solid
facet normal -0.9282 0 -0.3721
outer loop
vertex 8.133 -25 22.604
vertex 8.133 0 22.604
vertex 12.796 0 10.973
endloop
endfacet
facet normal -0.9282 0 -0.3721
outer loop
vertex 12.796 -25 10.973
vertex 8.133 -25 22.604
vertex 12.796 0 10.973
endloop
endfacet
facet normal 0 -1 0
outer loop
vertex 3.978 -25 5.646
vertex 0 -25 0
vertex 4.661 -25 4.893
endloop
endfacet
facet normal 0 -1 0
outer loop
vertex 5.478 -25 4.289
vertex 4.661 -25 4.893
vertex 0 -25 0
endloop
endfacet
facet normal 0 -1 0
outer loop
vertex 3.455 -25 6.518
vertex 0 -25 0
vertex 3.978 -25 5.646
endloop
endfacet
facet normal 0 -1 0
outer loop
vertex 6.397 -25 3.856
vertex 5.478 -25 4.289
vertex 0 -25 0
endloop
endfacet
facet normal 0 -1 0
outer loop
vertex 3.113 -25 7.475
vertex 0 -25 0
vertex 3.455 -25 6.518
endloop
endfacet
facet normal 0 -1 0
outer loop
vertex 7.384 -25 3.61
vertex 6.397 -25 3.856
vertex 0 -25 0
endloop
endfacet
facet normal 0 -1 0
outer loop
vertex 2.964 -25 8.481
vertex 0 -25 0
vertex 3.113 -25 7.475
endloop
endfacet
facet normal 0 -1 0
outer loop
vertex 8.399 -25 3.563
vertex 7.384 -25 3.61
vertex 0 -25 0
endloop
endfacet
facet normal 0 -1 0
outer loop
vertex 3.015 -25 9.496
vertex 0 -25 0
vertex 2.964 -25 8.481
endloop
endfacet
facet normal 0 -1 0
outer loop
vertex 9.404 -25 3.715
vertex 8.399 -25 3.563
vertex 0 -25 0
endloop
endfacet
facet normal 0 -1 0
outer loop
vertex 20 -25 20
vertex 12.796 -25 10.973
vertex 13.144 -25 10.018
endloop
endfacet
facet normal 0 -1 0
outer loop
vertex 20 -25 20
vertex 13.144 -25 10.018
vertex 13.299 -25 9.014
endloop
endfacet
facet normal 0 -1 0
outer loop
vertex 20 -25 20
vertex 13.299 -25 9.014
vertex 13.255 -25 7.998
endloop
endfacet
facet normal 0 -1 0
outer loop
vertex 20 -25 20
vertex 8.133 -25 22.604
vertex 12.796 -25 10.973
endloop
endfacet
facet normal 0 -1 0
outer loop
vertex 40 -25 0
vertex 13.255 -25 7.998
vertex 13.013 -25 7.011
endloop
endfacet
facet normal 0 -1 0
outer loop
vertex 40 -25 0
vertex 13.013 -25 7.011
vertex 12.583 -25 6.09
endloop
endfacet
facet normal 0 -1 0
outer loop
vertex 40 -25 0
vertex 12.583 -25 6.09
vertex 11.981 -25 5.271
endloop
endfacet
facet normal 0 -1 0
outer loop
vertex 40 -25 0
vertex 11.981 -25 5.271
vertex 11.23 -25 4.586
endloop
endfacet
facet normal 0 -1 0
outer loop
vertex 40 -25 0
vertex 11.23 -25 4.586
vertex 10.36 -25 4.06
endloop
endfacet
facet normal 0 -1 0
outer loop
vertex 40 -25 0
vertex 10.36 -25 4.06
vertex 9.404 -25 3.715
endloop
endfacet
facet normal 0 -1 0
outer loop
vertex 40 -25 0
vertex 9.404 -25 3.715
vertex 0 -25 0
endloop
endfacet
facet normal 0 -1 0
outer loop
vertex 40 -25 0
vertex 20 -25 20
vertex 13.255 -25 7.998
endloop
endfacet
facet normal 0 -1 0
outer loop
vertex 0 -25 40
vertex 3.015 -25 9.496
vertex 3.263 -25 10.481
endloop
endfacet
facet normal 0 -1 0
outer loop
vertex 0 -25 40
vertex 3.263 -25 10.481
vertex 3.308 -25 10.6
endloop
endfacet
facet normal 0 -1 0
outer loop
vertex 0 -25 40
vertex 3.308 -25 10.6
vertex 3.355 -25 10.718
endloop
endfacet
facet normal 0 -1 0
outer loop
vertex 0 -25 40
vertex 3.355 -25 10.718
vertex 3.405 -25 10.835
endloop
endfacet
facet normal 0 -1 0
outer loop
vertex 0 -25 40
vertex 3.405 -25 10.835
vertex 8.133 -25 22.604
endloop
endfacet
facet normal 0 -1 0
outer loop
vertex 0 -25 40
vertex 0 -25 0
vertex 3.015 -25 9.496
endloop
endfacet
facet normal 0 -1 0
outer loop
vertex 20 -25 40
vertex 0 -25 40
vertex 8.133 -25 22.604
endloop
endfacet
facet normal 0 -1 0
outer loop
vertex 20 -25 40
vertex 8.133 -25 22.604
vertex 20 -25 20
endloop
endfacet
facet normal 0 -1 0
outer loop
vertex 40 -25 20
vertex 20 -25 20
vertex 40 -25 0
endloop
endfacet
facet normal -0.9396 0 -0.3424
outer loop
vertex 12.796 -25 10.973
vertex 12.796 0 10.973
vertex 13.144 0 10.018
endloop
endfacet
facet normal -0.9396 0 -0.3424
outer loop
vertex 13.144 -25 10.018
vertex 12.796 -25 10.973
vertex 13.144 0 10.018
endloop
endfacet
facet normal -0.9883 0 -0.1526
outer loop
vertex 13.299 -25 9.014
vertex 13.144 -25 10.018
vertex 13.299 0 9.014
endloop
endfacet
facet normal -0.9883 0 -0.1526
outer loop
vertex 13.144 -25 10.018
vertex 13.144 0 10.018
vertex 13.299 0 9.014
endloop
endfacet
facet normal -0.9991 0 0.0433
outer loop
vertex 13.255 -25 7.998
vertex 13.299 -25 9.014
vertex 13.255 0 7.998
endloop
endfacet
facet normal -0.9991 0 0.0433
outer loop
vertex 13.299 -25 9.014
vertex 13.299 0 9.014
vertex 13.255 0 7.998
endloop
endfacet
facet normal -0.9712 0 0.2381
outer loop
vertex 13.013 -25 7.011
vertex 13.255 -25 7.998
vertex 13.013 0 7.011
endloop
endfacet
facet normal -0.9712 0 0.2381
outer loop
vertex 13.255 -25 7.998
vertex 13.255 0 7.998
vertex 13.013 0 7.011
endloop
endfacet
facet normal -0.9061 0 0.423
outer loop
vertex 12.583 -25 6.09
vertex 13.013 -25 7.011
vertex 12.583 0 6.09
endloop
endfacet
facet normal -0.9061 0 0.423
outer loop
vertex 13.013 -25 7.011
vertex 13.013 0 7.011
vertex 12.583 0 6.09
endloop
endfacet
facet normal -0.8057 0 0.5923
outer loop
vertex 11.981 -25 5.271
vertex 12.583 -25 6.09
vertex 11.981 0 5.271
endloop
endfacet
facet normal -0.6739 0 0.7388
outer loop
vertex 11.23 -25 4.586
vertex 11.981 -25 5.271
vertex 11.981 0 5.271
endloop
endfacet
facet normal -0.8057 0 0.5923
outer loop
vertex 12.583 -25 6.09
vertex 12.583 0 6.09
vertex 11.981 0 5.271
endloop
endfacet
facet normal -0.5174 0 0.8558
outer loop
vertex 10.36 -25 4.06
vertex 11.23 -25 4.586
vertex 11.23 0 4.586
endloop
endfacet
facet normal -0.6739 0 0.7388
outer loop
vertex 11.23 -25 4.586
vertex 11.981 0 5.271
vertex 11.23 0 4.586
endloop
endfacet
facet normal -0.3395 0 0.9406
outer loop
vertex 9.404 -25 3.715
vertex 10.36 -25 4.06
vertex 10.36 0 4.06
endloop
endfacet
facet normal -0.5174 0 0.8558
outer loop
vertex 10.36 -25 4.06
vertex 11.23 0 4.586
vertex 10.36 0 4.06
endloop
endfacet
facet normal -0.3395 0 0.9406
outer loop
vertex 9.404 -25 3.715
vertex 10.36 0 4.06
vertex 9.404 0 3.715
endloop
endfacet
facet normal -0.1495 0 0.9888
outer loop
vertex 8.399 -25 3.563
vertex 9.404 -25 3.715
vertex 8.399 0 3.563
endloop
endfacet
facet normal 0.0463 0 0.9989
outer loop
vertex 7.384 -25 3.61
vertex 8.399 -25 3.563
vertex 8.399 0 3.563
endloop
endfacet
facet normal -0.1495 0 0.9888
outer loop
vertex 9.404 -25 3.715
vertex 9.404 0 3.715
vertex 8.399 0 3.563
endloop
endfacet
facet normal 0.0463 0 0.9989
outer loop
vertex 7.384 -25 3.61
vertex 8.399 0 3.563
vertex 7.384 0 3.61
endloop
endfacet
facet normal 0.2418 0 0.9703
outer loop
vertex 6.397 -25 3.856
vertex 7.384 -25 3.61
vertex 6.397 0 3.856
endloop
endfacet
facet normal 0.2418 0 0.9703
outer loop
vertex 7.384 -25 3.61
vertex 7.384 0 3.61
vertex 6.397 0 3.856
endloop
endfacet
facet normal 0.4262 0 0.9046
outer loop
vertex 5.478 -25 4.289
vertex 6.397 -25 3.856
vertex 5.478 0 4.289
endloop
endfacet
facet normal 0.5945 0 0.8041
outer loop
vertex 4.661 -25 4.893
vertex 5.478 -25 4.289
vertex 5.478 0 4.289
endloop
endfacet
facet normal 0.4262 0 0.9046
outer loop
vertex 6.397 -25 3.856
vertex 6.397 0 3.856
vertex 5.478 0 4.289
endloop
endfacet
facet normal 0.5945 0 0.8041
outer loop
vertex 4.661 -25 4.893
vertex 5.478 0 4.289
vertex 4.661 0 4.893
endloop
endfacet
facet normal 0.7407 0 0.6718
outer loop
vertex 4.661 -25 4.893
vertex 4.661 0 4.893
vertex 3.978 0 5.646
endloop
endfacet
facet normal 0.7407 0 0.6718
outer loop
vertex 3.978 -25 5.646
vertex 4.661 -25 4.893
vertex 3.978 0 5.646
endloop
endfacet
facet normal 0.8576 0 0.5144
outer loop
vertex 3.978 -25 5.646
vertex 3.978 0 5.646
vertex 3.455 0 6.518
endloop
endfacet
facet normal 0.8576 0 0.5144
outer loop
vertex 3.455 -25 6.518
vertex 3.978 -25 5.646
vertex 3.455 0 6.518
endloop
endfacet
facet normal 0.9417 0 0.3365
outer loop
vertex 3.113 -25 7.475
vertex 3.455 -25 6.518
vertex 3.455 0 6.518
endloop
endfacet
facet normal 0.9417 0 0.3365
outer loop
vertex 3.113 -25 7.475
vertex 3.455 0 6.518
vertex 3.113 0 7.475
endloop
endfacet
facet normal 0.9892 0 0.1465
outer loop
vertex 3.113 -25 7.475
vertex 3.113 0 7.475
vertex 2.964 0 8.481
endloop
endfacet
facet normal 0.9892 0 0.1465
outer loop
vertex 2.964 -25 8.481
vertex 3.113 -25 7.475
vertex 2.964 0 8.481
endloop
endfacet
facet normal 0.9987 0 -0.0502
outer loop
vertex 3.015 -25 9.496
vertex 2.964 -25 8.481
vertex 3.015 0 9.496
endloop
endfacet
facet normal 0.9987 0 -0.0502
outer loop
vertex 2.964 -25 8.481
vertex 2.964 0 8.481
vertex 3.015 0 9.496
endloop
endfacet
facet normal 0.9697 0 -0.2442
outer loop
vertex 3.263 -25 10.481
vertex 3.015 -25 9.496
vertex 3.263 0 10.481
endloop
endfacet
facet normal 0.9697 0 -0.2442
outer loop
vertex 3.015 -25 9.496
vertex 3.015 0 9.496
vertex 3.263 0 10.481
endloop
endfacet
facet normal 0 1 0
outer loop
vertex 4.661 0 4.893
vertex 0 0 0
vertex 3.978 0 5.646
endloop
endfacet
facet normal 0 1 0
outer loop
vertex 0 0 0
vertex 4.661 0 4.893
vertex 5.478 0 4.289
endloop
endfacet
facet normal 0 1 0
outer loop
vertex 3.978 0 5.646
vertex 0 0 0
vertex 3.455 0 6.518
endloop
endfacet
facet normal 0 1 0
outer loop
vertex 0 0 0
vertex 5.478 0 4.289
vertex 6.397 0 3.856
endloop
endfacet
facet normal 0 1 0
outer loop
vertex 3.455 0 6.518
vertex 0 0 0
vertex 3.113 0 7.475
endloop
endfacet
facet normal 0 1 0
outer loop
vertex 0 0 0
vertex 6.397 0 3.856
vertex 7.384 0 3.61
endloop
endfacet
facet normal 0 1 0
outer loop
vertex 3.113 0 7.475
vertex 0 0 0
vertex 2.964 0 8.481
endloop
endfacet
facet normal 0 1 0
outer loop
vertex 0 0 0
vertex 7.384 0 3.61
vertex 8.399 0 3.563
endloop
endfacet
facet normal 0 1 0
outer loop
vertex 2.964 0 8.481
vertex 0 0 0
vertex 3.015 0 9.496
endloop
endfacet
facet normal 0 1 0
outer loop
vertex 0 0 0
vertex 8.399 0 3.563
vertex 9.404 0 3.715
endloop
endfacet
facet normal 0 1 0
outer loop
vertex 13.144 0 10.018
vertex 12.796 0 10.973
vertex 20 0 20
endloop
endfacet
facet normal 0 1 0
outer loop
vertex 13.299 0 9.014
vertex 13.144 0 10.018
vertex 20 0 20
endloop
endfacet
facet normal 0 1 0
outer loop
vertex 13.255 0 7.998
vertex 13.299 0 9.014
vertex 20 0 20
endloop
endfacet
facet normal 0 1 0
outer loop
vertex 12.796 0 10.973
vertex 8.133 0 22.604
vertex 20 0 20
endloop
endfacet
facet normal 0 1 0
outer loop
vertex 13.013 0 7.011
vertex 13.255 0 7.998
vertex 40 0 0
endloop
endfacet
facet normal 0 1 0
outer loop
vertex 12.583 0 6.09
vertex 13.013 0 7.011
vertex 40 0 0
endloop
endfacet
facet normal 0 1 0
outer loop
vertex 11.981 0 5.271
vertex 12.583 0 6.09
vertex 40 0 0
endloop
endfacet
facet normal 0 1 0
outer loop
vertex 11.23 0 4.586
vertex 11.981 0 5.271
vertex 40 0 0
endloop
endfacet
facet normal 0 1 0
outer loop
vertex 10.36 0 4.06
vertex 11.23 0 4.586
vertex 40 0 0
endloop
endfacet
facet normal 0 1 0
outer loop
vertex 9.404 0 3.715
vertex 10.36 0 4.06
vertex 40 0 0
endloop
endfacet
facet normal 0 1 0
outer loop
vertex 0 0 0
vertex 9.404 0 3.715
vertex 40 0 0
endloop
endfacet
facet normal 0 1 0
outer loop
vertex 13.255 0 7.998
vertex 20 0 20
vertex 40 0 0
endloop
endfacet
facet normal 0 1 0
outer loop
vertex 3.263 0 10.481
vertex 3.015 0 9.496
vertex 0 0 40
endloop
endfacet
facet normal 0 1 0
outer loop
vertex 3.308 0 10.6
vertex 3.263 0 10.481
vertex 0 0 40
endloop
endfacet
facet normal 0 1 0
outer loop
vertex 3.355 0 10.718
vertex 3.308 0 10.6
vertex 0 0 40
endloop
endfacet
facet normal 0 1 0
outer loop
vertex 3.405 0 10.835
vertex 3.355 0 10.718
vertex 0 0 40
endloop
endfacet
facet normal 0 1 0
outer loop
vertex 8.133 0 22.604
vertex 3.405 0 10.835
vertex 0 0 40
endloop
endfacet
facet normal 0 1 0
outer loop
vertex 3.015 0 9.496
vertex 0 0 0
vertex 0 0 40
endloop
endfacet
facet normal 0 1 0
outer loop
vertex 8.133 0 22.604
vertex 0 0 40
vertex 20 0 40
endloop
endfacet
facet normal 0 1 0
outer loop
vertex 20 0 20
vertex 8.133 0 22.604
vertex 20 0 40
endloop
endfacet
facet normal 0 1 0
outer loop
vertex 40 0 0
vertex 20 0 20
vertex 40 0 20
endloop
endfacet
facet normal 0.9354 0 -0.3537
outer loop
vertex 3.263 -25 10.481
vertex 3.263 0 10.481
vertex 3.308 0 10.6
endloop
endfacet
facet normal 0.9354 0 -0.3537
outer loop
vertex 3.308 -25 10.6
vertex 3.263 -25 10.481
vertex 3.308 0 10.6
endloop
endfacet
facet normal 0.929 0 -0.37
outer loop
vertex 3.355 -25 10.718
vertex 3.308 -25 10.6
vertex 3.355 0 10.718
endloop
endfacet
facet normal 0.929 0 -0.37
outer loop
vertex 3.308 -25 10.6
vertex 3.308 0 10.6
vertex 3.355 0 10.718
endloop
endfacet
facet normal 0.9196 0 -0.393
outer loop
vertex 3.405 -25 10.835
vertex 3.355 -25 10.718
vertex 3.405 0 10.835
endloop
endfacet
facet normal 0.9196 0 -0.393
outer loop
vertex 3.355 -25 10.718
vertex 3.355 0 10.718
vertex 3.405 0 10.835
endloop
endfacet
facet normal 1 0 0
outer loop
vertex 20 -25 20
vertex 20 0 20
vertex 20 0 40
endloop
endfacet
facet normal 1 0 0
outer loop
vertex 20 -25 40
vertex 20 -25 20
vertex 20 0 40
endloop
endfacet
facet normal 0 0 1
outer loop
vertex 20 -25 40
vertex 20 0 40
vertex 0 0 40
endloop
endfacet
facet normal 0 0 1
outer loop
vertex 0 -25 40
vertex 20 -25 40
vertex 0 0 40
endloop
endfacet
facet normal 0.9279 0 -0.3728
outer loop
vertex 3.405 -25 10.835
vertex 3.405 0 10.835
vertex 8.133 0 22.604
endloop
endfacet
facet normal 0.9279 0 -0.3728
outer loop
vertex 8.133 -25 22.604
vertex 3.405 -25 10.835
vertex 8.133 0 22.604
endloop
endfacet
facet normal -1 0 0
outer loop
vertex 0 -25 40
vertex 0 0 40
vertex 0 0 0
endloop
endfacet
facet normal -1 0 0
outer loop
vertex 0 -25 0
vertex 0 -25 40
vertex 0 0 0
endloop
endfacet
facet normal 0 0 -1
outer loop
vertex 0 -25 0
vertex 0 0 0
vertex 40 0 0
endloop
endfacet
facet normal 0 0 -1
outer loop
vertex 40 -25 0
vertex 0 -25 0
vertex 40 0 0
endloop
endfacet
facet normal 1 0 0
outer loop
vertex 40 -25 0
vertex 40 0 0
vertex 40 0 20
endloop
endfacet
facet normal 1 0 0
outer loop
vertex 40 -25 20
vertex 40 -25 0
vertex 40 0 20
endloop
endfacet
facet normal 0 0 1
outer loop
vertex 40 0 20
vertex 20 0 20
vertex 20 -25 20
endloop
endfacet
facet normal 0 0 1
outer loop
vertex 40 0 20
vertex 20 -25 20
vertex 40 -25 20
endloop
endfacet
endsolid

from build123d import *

# Parameters (mm, degrees)
F0_W     = 20
F0_H     = 20
F1_DEPTH = 25


with BuildPart() as f1:
    # F0 (on Front) → F1 (new body)
    with BuildSketch(Plane.XZ):
        Polygon((0, 4.873418), (0, 0), (20, 0), (20, 20), (20, 40), (0, 40), align=None)
        with BuildLine():
            ThreePointArc((3.263231, 10.481385), (3.330913, 10.659271), (3.405091, 10.834548))
            Line((3.405091, 10.834548), (8.132556, 22.603722))
            Line((8.132556, 22.603722), (12.795818, 10.973252))
            ThreePointArc((12.795818, 10.973252), (8.399199, 3.562881), (3.263231, 10.481385))
        make_face(mode=Mode.SUBTRACT)
        with Locations((30, 10)):
            Rectangle(F0_W, F0_H)
    extrude(amount=F1_DEPTH)


solid = f1.part
